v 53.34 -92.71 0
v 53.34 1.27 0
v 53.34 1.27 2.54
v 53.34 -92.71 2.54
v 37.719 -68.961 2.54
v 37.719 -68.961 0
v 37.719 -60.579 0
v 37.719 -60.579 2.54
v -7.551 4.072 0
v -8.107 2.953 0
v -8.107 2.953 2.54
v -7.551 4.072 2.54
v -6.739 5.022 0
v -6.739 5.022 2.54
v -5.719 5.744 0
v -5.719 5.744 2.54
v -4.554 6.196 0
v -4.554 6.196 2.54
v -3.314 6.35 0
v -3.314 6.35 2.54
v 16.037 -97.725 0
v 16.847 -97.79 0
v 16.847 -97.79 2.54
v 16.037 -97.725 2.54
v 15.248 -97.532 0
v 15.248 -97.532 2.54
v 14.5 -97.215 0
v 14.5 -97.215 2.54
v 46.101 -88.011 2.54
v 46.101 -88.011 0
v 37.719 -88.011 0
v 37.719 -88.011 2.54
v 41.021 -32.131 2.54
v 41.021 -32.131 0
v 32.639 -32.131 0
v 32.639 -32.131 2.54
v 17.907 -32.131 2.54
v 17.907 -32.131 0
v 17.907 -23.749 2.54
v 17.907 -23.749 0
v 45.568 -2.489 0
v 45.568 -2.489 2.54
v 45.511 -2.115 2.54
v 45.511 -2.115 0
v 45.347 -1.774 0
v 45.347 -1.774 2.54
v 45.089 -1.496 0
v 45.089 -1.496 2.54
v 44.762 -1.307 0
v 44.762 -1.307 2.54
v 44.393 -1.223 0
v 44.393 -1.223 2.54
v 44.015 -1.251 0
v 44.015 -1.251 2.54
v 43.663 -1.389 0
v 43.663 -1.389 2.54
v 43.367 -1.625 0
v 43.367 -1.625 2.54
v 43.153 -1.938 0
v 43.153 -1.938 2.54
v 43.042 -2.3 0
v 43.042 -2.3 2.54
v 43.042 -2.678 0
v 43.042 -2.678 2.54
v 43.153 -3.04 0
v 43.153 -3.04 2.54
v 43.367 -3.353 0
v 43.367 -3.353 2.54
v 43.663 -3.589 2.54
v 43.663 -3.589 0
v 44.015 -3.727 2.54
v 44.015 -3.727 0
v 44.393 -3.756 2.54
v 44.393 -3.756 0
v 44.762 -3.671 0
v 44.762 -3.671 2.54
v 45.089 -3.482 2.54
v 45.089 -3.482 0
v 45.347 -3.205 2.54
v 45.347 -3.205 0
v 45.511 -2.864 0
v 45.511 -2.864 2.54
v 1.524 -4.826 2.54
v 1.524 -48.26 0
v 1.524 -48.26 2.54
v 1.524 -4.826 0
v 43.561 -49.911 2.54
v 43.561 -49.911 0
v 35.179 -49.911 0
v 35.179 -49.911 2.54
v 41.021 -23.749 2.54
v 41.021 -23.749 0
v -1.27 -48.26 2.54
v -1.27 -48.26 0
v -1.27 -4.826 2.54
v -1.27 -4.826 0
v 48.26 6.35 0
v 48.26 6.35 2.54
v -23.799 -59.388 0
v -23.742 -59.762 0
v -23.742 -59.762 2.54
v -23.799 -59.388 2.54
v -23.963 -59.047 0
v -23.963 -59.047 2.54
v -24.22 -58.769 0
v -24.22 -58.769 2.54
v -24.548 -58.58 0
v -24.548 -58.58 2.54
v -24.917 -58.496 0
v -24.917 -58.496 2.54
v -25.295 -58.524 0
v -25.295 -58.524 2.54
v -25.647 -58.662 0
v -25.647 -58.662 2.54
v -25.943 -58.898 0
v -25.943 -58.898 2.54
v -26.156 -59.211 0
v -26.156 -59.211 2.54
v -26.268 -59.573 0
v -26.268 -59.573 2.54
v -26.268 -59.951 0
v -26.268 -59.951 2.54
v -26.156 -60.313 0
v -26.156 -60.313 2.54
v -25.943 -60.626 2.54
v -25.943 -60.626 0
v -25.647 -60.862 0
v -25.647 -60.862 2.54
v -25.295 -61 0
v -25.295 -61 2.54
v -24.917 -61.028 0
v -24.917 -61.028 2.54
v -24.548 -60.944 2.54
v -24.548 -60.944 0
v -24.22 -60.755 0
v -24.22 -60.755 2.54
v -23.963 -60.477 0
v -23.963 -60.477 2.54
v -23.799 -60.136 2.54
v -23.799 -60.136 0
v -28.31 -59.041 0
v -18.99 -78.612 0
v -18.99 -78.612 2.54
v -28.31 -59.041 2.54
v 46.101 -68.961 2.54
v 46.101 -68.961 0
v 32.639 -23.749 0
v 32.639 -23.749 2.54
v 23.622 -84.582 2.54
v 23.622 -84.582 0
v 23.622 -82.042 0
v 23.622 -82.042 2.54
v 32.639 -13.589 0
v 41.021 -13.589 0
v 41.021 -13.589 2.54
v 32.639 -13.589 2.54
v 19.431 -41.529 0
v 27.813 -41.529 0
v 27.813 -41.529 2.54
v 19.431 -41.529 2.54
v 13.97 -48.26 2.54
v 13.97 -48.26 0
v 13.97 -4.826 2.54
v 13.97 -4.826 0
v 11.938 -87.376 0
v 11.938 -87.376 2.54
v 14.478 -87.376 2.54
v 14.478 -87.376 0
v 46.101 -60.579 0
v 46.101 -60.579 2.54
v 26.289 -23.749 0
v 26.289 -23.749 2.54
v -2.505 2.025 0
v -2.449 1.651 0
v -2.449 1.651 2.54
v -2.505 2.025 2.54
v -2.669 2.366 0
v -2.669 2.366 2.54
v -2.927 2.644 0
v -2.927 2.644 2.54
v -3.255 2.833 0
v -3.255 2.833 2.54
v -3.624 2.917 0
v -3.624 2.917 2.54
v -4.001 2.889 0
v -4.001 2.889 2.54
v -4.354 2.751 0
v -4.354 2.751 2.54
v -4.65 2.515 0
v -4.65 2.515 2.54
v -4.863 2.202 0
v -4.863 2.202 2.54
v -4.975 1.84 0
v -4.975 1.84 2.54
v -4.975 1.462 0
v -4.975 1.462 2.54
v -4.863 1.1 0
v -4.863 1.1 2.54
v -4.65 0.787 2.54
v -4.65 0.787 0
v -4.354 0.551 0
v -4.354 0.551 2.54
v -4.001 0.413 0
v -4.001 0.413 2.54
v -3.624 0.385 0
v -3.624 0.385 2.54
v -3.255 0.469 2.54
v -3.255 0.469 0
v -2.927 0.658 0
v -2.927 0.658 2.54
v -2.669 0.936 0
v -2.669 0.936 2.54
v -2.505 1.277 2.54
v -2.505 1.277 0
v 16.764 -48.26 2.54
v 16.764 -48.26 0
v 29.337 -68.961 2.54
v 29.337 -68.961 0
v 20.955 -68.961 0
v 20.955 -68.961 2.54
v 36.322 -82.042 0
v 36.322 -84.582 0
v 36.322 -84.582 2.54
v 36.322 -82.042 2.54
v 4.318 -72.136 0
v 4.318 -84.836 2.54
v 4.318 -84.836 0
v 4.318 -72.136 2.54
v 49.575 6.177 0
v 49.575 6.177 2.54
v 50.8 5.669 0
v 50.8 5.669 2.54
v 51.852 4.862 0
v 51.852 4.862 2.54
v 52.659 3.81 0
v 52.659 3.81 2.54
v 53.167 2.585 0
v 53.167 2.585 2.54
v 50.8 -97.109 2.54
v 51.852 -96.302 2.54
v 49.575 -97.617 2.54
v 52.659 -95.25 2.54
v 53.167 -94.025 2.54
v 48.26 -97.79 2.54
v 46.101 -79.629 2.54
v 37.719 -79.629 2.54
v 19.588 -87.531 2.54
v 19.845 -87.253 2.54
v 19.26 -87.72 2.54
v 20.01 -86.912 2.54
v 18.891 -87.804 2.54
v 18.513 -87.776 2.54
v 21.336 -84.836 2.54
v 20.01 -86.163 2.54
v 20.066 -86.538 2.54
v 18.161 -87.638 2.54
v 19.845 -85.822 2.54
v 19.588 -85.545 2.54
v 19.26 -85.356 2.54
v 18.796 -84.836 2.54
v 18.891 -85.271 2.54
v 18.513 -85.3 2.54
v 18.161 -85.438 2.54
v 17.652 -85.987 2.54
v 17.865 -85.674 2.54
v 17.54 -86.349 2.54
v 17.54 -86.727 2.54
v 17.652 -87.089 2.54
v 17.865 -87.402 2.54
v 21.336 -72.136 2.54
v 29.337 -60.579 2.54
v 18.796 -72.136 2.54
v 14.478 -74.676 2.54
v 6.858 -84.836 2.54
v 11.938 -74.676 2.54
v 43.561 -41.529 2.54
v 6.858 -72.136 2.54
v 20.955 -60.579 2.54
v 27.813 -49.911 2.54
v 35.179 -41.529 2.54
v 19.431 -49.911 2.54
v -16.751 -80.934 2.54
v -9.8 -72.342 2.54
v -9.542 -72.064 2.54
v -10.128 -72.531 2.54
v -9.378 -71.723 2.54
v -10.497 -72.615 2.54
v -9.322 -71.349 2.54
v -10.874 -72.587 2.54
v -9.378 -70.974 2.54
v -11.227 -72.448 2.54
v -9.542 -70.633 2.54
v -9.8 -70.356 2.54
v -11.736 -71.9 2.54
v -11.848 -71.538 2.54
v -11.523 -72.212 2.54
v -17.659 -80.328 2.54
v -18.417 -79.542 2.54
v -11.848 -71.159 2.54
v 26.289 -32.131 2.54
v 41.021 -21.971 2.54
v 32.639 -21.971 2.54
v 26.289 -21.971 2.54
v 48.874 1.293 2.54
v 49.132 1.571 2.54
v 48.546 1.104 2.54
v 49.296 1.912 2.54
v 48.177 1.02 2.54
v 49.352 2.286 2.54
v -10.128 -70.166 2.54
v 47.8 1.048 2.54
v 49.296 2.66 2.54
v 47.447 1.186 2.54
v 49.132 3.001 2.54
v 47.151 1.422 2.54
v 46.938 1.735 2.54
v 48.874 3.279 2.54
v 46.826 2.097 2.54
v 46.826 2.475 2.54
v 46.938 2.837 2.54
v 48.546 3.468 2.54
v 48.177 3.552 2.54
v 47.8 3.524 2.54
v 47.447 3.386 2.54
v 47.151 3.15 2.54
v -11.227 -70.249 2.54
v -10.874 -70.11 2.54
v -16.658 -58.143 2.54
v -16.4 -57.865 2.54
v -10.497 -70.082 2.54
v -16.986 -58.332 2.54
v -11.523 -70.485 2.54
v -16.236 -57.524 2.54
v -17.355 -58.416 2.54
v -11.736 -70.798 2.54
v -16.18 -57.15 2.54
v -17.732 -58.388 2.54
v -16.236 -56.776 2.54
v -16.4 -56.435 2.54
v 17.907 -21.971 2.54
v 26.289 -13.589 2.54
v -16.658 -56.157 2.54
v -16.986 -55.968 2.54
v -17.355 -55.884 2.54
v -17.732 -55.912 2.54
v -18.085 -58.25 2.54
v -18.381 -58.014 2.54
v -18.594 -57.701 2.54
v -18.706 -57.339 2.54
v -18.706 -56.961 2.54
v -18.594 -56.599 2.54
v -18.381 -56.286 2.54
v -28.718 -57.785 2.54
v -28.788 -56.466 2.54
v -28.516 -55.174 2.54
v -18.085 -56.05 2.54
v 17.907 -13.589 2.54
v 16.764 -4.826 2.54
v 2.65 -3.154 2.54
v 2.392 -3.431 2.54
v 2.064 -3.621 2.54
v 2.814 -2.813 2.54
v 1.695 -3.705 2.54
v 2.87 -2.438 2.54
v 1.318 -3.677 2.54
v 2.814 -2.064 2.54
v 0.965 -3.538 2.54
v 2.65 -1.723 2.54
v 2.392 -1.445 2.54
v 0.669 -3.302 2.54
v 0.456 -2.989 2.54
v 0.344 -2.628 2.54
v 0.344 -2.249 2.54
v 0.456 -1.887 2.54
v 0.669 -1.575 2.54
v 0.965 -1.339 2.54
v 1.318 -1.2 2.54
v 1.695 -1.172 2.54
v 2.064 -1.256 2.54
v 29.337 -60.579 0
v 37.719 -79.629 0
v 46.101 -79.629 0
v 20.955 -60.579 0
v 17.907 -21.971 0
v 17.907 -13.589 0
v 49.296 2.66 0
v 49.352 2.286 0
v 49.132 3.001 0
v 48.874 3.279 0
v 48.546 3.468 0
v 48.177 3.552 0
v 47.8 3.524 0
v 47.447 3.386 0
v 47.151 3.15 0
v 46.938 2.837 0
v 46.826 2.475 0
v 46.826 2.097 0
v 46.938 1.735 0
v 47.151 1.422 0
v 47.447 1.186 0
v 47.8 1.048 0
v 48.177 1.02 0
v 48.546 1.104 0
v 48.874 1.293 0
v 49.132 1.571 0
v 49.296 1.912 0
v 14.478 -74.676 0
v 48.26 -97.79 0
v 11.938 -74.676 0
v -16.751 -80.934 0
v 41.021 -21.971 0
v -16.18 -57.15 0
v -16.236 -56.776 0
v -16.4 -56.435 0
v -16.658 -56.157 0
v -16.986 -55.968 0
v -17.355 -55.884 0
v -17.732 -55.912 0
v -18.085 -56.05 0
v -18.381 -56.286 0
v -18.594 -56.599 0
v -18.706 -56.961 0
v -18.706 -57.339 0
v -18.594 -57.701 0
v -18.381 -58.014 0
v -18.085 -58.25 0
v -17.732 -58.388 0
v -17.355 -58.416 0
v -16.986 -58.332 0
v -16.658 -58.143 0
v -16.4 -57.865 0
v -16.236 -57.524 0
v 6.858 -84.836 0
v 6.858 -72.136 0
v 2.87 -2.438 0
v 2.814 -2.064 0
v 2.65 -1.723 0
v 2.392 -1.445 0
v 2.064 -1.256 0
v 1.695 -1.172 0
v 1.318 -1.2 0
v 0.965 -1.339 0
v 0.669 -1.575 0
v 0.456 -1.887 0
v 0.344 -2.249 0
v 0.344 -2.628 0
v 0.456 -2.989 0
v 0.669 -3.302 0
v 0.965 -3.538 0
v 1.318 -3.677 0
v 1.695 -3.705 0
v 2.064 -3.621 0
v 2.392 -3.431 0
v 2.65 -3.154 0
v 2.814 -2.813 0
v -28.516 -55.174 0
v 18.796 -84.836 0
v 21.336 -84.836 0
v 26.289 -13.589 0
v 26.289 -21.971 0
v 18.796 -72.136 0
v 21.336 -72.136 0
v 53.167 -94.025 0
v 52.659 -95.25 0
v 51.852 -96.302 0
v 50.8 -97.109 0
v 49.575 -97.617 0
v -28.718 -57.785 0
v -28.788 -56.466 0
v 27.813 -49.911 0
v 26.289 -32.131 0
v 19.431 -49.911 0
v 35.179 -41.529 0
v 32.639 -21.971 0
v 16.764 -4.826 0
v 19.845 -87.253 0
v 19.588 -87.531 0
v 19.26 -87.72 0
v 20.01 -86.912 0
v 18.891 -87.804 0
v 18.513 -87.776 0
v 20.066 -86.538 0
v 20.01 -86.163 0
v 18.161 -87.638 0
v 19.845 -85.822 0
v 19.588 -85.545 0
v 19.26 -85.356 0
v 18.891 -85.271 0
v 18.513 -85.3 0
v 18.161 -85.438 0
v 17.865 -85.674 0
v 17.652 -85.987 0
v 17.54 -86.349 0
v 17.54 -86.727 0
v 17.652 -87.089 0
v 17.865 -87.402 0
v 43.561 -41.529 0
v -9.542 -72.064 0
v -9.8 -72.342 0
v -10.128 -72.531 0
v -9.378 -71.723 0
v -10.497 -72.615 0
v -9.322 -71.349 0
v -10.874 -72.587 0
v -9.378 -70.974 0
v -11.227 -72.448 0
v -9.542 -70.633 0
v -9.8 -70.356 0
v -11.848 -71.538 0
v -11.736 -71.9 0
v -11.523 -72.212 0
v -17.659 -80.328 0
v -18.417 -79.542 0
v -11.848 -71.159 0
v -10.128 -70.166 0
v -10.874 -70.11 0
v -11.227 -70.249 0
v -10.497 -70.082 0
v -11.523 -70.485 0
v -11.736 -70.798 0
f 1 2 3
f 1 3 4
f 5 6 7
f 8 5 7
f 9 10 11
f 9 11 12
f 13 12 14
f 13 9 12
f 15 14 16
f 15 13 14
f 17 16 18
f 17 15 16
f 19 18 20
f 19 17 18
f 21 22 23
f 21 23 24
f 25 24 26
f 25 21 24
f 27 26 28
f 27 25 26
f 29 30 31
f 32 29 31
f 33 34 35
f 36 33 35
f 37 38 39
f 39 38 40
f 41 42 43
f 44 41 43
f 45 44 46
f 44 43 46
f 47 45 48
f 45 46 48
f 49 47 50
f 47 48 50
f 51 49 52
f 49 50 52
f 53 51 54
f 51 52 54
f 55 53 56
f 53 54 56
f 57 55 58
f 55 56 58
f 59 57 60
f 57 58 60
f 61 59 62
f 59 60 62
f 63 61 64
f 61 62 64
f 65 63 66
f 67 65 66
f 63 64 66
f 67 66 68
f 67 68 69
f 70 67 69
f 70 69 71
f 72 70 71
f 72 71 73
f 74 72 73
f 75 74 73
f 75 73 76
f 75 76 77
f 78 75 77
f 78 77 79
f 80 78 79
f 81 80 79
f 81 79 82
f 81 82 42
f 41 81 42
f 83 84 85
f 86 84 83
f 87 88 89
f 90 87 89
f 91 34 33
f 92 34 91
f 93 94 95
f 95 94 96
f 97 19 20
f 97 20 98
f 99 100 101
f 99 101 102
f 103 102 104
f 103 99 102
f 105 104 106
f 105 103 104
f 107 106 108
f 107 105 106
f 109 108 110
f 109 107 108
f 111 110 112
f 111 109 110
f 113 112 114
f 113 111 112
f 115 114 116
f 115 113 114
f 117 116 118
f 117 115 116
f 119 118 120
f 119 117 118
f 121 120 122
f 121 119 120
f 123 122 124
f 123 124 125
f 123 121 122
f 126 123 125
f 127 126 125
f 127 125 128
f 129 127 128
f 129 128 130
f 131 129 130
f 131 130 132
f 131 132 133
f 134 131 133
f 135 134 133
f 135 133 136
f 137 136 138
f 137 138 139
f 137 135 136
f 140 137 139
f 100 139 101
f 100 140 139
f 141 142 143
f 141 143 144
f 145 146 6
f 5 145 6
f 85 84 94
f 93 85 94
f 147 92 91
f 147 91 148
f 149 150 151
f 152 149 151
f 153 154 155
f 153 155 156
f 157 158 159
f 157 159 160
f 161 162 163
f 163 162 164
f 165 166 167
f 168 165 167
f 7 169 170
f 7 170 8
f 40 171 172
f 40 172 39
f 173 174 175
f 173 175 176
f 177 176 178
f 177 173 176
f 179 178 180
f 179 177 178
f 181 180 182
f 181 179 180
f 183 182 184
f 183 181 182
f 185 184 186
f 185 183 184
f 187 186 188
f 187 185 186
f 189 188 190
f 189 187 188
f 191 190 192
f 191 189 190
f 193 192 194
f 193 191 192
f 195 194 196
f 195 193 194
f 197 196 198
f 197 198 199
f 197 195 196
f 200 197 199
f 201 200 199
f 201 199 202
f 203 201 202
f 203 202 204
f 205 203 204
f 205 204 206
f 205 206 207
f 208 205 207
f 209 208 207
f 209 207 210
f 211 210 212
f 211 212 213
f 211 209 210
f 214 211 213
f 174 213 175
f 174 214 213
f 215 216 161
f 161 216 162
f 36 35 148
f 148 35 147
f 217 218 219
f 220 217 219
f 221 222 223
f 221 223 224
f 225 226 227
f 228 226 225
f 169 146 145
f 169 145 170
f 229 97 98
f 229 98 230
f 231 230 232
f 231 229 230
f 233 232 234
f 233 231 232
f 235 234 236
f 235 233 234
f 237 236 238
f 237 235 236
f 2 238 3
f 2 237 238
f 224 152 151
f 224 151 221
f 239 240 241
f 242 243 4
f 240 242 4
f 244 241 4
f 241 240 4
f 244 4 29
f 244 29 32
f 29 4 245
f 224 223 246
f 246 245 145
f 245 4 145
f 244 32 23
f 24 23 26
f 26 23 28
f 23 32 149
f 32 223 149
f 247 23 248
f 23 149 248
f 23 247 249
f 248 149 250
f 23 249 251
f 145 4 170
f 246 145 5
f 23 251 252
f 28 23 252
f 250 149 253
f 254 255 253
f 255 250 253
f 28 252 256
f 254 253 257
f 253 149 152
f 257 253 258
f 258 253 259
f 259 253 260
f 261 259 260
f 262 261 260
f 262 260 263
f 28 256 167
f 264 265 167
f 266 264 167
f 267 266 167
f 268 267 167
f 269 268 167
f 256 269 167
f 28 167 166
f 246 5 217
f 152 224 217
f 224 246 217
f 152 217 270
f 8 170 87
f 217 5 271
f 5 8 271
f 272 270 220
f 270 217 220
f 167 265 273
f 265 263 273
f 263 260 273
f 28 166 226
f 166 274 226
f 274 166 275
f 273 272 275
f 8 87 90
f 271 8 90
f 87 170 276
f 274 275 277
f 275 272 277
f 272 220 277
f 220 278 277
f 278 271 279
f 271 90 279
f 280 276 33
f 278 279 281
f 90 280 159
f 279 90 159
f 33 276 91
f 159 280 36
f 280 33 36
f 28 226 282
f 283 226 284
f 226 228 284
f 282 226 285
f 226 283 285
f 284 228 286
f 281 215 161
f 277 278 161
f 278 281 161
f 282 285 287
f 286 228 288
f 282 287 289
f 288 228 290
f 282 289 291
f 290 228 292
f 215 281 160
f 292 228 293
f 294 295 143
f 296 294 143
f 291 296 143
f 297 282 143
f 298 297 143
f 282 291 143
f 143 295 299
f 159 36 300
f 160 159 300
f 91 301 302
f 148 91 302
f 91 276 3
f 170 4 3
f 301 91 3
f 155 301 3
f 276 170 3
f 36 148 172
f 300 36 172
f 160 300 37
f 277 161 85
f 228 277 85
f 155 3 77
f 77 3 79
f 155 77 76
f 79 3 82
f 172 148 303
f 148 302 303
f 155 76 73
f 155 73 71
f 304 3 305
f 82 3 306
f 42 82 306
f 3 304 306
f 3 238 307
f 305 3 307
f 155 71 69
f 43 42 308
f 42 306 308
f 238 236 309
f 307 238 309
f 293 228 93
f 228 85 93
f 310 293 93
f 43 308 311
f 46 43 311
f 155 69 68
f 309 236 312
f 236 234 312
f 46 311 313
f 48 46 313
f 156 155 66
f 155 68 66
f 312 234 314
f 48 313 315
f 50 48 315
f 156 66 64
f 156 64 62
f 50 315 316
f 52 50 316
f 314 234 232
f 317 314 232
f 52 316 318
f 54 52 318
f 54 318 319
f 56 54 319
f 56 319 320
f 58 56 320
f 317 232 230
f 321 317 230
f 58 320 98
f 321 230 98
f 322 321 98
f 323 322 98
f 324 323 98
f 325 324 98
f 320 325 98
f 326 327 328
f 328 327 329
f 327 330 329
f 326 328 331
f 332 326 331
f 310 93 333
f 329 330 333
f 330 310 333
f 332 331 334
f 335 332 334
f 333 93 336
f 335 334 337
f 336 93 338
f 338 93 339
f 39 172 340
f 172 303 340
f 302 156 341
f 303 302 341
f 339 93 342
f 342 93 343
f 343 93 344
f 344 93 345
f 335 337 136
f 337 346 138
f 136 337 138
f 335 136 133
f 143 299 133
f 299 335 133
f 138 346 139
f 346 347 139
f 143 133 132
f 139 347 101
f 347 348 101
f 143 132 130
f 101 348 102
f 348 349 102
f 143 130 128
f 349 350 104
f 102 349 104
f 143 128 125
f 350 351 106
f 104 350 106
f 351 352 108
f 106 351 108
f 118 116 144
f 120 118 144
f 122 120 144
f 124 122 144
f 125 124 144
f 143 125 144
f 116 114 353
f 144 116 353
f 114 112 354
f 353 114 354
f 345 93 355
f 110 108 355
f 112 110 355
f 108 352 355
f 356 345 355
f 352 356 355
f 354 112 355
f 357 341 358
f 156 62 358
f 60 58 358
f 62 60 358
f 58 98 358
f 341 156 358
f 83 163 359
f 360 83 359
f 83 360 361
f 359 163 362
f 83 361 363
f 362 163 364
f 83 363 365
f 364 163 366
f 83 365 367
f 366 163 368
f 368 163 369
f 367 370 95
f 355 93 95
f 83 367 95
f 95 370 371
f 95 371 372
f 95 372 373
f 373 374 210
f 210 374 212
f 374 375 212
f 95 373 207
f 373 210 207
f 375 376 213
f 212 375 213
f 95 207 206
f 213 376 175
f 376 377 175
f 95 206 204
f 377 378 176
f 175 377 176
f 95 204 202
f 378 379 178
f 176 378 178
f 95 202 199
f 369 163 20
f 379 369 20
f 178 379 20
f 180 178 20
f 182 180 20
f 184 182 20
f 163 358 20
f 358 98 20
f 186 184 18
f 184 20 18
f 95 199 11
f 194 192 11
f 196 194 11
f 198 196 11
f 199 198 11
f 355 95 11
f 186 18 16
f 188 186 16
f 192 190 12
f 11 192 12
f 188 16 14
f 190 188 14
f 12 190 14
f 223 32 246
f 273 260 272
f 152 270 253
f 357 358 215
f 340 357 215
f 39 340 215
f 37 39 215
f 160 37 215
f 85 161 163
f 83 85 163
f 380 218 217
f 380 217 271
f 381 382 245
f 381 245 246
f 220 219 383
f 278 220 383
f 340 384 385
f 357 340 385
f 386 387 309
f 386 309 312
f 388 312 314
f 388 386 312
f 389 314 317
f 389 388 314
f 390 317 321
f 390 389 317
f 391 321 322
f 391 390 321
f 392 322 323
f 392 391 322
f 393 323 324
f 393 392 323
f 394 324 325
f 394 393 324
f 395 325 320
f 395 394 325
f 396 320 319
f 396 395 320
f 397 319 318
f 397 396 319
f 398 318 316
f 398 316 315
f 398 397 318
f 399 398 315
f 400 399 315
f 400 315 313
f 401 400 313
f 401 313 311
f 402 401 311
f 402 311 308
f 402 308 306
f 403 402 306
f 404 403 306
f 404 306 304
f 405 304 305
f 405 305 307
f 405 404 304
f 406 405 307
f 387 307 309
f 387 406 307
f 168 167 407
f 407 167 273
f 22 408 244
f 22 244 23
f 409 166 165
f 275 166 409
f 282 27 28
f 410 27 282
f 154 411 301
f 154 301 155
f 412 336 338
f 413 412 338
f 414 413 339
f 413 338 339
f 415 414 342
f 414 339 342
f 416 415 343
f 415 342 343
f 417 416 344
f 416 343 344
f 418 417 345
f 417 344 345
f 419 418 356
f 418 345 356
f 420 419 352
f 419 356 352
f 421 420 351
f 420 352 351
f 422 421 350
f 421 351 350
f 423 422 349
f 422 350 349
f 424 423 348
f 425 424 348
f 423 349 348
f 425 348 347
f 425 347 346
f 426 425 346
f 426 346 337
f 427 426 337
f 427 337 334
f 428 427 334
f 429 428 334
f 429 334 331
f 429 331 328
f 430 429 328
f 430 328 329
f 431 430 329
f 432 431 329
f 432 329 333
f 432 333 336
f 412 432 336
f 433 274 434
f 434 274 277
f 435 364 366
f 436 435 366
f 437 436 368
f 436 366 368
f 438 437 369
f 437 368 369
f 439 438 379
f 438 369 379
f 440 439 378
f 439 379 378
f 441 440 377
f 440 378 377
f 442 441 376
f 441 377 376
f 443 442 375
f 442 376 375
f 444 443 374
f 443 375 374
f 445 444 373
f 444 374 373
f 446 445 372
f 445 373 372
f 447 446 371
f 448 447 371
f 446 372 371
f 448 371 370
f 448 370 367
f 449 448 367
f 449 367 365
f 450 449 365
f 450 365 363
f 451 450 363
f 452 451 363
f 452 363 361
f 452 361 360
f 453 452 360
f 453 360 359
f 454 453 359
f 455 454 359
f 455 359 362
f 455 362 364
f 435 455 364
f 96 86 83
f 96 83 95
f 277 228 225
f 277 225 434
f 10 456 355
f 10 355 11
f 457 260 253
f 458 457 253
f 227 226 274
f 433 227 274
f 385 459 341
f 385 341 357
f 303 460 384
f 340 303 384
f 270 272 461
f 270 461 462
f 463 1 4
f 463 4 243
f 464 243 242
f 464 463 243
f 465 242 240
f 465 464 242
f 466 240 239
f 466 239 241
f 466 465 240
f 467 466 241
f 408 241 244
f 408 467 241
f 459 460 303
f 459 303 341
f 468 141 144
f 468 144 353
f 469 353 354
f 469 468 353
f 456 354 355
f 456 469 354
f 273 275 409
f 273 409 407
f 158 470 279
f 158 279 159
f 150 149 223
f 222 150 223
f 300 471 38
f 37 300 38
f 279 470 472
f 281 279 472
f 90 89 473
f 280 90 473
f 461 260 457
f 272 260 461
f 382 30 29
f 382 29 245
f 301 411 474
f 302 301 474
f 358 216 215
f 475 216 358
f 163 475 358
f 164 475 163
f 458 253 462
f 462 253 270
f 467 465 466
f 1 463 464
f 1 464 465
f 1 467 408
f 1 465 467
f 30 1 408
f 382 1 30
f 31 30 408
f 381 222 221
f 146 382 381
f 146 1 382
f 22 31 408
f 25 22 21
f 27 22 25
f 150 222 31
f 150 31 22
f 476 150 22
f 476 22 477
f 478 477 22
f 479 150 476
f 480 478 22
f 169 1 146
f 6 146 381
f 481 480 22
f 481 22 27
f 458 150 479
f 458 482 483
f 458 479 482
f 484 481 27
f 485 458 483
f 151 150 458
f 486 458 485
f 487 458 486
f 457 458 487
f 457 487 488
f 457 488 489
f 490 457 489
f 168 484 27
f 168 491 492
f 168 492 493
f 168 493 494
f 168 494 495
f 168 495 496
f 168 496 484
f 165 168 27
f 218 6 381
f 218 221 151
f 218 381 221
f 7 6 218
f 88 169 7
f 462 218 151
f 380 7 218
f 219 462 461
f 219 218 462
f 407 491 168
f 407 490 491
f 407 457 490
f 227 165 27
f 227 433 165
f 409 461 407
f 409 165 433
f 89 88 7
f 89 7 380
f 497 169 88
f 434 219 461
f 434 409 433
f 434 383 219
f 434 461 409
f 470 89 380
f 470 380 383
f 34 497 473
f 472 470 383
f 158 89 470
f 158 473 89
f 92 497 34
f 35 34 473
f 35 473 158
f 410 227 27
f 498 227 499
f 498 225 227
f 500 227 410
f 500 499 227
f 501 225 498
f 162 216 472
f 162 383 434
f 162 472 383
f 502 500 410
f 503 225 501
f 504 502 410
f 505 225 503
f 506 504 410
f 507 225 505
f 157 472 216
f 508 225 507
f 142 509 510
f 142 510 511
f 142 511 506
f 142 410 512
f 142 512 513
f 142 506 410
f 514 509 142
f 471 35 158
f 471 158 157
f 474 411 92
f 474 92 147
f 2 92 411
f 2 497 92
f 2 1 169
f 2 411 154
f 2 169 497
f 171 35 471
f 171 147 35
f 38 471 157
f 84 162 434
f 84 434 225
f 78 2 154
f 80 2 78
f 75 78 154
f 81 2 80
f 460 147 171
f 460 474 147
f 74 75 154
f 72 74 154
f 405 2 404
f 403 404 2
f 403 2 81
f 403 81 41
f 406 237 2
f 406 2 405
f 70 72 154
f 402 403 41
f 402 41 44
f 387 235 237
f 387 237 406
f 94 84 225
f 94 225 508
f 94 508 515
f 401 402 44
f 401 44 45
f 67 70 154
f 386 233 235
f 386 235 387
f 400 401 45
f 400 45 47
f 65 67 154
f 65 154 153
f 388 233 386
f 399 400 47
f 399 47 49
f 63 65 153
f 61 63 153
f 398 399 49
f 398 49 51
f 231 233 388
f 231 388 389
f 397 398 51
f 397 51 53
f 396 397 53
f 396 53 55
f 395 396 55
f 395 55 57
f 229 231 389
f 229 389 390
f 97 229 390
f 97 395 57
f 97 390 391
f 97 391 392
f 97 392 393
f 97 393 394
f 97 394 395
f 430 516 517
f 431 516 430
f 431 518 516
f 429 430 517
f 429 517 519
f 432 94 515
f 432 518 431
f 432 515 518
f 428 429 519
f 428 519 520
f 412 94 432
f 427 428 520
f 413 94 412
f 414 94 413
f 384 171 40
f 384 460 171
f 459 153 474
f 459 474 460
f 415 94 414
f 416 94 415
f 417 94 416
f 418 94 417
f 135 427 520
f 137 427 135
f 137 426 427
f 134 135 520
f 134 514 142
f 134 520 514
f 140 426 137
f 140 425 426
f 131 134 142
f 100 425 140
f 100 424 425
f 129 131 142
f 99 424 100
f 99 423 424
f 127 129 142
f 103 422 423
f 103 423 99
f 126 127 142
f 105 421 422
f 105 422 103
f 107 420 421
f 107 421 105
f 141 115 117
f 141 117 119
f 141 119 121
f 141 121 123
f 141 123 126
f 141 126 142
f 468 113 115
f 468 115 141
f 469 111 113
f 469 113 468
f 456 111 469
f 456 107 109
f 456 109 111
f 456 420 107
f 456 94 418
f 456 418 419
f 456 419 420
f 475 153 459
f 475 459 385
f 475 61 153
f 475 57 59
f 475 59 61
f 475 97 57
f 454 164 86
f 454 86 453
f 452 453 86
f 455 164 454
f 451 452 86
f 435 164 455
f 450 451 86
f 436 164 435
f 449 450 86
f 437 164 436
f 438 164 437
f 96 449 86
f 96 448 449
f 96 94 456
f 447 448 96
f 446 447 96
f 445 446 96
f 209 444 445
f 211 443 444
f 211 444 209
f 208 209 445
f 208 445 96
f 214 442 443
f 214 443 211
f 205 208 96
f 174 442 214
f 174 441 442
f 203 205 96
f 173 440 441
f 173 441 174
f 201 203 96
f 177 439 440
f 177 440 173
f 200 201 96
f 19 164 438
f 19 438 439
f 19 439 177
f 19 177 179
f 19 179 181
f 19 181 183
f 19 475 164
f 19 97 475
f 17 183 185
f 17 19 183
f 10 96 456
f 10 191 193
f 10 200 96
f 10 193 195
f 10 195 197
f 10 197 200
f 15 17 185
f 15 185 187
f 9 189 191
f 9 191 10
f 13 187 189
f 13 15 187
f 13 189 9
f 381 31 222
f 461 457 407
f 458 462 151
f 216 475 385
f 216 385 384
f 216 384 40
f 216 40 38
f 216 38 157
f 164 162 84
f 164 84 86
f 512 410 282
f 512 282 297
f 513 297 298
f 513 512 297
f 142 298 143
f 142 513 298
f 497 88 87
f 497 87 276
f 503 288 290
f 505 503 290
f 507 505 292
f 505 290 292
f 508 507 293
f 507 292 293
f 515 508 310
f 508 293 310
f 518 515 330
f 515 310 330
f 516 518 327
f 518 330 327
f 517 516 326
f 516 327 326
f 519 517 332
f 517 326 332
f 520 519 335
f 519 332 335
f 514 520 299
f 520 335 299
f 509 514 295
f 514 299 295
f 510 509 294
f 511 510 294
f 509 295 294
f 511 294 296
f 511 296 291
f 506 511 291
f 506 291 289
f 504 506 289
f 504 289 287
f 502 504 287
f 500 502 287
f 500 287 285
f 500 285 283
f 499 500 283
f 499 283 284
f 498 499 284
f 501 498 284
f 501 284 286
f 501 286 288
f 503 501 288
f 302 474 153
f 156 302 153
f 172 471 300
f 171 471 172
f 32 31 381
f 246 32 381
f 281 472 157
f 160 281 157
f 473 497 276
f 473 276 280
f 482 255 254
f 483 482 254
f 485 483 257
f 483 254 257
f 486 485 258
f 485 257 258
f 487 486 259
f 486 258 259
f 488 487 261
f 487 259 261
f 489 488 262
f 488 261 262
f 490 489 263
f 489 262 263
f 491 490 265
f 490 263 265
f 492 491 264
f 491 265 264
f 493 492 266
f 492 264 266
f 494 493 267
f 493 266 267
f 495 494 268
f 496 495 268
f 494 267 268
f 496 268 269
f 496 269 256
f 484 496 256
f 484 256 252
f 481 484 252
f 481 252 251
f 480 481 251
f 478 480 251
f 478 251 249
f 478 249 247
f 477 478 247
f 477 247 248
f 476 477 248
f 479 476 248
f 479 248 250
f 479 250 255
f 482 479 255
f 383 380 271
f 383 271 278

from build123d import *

# Parameters (mm, degrees)
SKETCH1_R           = 1.27
BOSS_EXTRUDE1_DEPTH = 2.54
SKETCH5_W           = 8.382
SKETCH5_H           = 8.382
SKETCH5_W_2         = 2.794
SKETCH5_H_2         = 43.434
CUT_EXTRUDE1_DEPTH  = 3.54
SKETCH7_R           = 1.27
CUT_EXTRUDE3_DEPTH  = 3.54
SKETCH8_W           = 12.7
SKETCH8_H           = 2.54
SKETCH8_W_2         = 2.54
SKETCH8_H_2         = 12.7
CUT_EXTRUDE4_DEPTH  = 3.54


with BuildPart() as part:
    # Sketch1 → Boss-Extrude1 (new body)
    with BuildSketch(Plane.XY):
        with BuildLine():
            Line((-3.314058103, 6.35), (48.26, 6.35))
            ThreePointArc((48.26, 6.35), (51.852102448, 4.862102448), (53.34, 1.27))
            Line((53.34, 1.27), (53.34, -92.71))
            ThreePointArc((53.34, -92.71), (51.852102448, -96.302102448), (48.26, -97.79))
            Line((48.26, -97.79), (16.846989059, -97.79))
            ThreePointArc((16.846989059, -97.79), (15.638688158, -97.644208035), (14.499741809, -97.215200367))
            Line((14.499741809, -97.215200367), (-16.7505185, -80.933552139))
            ThreePointArc((-16.7505185, -80.933552139), (-18.059258376, -79.955412607), (-18.989802686, -78.61241436))
            Line((-18.989802686, -78.61241436), (-28.309569459, -59.040904135))
            ThreePointArc((-28.309569459, -59.040904135), (-28.795802898, -57.127870198), (-28.51617555, -55.173917704))
            Line((-28.51617555, -55.173917704), (-8.107195629, 2.952923842))
            ThreePointArc((-8.107195629, 2.952923842), (-6.251501454, 5.414614163), (-3.314058103, 6.35))
        make_face()
        with Locations((48.0822, 2.286)):
            Circle(SKETCH1_R, mode=Mode.SUBTRACT)
        with Locations((-3.718687848, 1.651)):
            Circle(SKETCH1_R, mode=Mode.SUBTRACT)
        with Locations((-25.012261453, -59.761967182)):
            Circle(SKETCH1_R, mode=Mode.SUBTRACT)
    extrude(amount=BOSS_EXTRUDE1_DEPTH)

    # Sketch5 → Cut-Extrude1 (cut, through all)
    with BuildSketch(Plane(origin=(0, 0, 0), x_dir=(-1, 0, 0), z_dir=(0, 0, -1))):
        with Locations((-36.83, -17.78)):
            Rectangle(SKETCH5_W, SKETCH5_H)
        with Locations((-39.37, -45.72)):
            Rectangle(SKETCH5_W, SKETCH5_H)
        with Locations((-36.83, -27.94)):
            Rectangle(SKETCH5_W, SKETCH5_H)
        with Locations((-41.91, -64.77)):
            Rectangle(SKETCH5_W, SKETCH5_H)
        with Locations((-41.91, -83.82)):
            Rectangle(SKETCH5_W, SKETCH5_H)
        with Locations((-22.098, -17.78)):
            Rectangle(SKETCH5_W, SKETCH5_H)
        with Locations((-22.098, -27.94)):
            Rectangle(SKETCH5_W, SKETCH5_H)
        with Locations((-23.622, -45.72)):
            Rectangle(SKETCH5_W, SKETCH5_H)
        with Locations((-25.146, -64.77)):
            Rectangle(SKETCH5_W, SKETCH5_H)
        with Locations((-15.367, -26.543)):
            Rectangle(SKETCH5_W_2, SKETCH5_H_2)
        with Locations((-0.127, -26.543)):
            Rectangle(SKETCH5_W_2, SKETCH5_H_2)
    extrude(amount=-CUT_EXTRUDE1_DEPTH, mode=Mode.SUBTRACT)

    # Sketch7 → Cut-Extrude3 (cut, through all)
    with BuildSketch(Plane.XY.offset(2.54)):
        with Locations((44.2976, -2.4892)):
            Circle(SKETCH7_R)
        with Locations((1.6002, -2.4384)):
            Circle(SKETCH7_R)
        with Locations((-17.4498, -57.15)):
            Circle(SKETCH7_R)
        with Locations((-10.5918, -71.3486)):
            Circle(SKETCH7_R)
        with Locations((18.796, -86.5378)):
            Circle(SKETCH7_R)
    extrude(amount=-CUT_EXTRUDE3_DEPTH, mode=Mode.SUBTRACT)

    # Sketch8 → Cut-Extrude4 (cut, through all)
    with BuildSketch(Plane.XY.offset(2.54)):
        with Locations((29.972, -83.312)):
            Rectangle(SKETCH8_W, SKETCH8_H)
        with Locations((20.066, -78.486)):
            Rectangle(SKETCH8_W_2, SKETCH8_H_2)
        with Locations((13.208, -81.026)):
            Rectangle(SKETCH8_W_2, SKETCH8_H_2)
        with Locations((5.588, -78.486)):
            Rectangle(SKETCH8_W_2, SKETCH8_H_2)
    extrude(amount=-CUT_EXTRUDE4_DEPTH, mode=Mode.SUBTRACT)


solid = part.part
